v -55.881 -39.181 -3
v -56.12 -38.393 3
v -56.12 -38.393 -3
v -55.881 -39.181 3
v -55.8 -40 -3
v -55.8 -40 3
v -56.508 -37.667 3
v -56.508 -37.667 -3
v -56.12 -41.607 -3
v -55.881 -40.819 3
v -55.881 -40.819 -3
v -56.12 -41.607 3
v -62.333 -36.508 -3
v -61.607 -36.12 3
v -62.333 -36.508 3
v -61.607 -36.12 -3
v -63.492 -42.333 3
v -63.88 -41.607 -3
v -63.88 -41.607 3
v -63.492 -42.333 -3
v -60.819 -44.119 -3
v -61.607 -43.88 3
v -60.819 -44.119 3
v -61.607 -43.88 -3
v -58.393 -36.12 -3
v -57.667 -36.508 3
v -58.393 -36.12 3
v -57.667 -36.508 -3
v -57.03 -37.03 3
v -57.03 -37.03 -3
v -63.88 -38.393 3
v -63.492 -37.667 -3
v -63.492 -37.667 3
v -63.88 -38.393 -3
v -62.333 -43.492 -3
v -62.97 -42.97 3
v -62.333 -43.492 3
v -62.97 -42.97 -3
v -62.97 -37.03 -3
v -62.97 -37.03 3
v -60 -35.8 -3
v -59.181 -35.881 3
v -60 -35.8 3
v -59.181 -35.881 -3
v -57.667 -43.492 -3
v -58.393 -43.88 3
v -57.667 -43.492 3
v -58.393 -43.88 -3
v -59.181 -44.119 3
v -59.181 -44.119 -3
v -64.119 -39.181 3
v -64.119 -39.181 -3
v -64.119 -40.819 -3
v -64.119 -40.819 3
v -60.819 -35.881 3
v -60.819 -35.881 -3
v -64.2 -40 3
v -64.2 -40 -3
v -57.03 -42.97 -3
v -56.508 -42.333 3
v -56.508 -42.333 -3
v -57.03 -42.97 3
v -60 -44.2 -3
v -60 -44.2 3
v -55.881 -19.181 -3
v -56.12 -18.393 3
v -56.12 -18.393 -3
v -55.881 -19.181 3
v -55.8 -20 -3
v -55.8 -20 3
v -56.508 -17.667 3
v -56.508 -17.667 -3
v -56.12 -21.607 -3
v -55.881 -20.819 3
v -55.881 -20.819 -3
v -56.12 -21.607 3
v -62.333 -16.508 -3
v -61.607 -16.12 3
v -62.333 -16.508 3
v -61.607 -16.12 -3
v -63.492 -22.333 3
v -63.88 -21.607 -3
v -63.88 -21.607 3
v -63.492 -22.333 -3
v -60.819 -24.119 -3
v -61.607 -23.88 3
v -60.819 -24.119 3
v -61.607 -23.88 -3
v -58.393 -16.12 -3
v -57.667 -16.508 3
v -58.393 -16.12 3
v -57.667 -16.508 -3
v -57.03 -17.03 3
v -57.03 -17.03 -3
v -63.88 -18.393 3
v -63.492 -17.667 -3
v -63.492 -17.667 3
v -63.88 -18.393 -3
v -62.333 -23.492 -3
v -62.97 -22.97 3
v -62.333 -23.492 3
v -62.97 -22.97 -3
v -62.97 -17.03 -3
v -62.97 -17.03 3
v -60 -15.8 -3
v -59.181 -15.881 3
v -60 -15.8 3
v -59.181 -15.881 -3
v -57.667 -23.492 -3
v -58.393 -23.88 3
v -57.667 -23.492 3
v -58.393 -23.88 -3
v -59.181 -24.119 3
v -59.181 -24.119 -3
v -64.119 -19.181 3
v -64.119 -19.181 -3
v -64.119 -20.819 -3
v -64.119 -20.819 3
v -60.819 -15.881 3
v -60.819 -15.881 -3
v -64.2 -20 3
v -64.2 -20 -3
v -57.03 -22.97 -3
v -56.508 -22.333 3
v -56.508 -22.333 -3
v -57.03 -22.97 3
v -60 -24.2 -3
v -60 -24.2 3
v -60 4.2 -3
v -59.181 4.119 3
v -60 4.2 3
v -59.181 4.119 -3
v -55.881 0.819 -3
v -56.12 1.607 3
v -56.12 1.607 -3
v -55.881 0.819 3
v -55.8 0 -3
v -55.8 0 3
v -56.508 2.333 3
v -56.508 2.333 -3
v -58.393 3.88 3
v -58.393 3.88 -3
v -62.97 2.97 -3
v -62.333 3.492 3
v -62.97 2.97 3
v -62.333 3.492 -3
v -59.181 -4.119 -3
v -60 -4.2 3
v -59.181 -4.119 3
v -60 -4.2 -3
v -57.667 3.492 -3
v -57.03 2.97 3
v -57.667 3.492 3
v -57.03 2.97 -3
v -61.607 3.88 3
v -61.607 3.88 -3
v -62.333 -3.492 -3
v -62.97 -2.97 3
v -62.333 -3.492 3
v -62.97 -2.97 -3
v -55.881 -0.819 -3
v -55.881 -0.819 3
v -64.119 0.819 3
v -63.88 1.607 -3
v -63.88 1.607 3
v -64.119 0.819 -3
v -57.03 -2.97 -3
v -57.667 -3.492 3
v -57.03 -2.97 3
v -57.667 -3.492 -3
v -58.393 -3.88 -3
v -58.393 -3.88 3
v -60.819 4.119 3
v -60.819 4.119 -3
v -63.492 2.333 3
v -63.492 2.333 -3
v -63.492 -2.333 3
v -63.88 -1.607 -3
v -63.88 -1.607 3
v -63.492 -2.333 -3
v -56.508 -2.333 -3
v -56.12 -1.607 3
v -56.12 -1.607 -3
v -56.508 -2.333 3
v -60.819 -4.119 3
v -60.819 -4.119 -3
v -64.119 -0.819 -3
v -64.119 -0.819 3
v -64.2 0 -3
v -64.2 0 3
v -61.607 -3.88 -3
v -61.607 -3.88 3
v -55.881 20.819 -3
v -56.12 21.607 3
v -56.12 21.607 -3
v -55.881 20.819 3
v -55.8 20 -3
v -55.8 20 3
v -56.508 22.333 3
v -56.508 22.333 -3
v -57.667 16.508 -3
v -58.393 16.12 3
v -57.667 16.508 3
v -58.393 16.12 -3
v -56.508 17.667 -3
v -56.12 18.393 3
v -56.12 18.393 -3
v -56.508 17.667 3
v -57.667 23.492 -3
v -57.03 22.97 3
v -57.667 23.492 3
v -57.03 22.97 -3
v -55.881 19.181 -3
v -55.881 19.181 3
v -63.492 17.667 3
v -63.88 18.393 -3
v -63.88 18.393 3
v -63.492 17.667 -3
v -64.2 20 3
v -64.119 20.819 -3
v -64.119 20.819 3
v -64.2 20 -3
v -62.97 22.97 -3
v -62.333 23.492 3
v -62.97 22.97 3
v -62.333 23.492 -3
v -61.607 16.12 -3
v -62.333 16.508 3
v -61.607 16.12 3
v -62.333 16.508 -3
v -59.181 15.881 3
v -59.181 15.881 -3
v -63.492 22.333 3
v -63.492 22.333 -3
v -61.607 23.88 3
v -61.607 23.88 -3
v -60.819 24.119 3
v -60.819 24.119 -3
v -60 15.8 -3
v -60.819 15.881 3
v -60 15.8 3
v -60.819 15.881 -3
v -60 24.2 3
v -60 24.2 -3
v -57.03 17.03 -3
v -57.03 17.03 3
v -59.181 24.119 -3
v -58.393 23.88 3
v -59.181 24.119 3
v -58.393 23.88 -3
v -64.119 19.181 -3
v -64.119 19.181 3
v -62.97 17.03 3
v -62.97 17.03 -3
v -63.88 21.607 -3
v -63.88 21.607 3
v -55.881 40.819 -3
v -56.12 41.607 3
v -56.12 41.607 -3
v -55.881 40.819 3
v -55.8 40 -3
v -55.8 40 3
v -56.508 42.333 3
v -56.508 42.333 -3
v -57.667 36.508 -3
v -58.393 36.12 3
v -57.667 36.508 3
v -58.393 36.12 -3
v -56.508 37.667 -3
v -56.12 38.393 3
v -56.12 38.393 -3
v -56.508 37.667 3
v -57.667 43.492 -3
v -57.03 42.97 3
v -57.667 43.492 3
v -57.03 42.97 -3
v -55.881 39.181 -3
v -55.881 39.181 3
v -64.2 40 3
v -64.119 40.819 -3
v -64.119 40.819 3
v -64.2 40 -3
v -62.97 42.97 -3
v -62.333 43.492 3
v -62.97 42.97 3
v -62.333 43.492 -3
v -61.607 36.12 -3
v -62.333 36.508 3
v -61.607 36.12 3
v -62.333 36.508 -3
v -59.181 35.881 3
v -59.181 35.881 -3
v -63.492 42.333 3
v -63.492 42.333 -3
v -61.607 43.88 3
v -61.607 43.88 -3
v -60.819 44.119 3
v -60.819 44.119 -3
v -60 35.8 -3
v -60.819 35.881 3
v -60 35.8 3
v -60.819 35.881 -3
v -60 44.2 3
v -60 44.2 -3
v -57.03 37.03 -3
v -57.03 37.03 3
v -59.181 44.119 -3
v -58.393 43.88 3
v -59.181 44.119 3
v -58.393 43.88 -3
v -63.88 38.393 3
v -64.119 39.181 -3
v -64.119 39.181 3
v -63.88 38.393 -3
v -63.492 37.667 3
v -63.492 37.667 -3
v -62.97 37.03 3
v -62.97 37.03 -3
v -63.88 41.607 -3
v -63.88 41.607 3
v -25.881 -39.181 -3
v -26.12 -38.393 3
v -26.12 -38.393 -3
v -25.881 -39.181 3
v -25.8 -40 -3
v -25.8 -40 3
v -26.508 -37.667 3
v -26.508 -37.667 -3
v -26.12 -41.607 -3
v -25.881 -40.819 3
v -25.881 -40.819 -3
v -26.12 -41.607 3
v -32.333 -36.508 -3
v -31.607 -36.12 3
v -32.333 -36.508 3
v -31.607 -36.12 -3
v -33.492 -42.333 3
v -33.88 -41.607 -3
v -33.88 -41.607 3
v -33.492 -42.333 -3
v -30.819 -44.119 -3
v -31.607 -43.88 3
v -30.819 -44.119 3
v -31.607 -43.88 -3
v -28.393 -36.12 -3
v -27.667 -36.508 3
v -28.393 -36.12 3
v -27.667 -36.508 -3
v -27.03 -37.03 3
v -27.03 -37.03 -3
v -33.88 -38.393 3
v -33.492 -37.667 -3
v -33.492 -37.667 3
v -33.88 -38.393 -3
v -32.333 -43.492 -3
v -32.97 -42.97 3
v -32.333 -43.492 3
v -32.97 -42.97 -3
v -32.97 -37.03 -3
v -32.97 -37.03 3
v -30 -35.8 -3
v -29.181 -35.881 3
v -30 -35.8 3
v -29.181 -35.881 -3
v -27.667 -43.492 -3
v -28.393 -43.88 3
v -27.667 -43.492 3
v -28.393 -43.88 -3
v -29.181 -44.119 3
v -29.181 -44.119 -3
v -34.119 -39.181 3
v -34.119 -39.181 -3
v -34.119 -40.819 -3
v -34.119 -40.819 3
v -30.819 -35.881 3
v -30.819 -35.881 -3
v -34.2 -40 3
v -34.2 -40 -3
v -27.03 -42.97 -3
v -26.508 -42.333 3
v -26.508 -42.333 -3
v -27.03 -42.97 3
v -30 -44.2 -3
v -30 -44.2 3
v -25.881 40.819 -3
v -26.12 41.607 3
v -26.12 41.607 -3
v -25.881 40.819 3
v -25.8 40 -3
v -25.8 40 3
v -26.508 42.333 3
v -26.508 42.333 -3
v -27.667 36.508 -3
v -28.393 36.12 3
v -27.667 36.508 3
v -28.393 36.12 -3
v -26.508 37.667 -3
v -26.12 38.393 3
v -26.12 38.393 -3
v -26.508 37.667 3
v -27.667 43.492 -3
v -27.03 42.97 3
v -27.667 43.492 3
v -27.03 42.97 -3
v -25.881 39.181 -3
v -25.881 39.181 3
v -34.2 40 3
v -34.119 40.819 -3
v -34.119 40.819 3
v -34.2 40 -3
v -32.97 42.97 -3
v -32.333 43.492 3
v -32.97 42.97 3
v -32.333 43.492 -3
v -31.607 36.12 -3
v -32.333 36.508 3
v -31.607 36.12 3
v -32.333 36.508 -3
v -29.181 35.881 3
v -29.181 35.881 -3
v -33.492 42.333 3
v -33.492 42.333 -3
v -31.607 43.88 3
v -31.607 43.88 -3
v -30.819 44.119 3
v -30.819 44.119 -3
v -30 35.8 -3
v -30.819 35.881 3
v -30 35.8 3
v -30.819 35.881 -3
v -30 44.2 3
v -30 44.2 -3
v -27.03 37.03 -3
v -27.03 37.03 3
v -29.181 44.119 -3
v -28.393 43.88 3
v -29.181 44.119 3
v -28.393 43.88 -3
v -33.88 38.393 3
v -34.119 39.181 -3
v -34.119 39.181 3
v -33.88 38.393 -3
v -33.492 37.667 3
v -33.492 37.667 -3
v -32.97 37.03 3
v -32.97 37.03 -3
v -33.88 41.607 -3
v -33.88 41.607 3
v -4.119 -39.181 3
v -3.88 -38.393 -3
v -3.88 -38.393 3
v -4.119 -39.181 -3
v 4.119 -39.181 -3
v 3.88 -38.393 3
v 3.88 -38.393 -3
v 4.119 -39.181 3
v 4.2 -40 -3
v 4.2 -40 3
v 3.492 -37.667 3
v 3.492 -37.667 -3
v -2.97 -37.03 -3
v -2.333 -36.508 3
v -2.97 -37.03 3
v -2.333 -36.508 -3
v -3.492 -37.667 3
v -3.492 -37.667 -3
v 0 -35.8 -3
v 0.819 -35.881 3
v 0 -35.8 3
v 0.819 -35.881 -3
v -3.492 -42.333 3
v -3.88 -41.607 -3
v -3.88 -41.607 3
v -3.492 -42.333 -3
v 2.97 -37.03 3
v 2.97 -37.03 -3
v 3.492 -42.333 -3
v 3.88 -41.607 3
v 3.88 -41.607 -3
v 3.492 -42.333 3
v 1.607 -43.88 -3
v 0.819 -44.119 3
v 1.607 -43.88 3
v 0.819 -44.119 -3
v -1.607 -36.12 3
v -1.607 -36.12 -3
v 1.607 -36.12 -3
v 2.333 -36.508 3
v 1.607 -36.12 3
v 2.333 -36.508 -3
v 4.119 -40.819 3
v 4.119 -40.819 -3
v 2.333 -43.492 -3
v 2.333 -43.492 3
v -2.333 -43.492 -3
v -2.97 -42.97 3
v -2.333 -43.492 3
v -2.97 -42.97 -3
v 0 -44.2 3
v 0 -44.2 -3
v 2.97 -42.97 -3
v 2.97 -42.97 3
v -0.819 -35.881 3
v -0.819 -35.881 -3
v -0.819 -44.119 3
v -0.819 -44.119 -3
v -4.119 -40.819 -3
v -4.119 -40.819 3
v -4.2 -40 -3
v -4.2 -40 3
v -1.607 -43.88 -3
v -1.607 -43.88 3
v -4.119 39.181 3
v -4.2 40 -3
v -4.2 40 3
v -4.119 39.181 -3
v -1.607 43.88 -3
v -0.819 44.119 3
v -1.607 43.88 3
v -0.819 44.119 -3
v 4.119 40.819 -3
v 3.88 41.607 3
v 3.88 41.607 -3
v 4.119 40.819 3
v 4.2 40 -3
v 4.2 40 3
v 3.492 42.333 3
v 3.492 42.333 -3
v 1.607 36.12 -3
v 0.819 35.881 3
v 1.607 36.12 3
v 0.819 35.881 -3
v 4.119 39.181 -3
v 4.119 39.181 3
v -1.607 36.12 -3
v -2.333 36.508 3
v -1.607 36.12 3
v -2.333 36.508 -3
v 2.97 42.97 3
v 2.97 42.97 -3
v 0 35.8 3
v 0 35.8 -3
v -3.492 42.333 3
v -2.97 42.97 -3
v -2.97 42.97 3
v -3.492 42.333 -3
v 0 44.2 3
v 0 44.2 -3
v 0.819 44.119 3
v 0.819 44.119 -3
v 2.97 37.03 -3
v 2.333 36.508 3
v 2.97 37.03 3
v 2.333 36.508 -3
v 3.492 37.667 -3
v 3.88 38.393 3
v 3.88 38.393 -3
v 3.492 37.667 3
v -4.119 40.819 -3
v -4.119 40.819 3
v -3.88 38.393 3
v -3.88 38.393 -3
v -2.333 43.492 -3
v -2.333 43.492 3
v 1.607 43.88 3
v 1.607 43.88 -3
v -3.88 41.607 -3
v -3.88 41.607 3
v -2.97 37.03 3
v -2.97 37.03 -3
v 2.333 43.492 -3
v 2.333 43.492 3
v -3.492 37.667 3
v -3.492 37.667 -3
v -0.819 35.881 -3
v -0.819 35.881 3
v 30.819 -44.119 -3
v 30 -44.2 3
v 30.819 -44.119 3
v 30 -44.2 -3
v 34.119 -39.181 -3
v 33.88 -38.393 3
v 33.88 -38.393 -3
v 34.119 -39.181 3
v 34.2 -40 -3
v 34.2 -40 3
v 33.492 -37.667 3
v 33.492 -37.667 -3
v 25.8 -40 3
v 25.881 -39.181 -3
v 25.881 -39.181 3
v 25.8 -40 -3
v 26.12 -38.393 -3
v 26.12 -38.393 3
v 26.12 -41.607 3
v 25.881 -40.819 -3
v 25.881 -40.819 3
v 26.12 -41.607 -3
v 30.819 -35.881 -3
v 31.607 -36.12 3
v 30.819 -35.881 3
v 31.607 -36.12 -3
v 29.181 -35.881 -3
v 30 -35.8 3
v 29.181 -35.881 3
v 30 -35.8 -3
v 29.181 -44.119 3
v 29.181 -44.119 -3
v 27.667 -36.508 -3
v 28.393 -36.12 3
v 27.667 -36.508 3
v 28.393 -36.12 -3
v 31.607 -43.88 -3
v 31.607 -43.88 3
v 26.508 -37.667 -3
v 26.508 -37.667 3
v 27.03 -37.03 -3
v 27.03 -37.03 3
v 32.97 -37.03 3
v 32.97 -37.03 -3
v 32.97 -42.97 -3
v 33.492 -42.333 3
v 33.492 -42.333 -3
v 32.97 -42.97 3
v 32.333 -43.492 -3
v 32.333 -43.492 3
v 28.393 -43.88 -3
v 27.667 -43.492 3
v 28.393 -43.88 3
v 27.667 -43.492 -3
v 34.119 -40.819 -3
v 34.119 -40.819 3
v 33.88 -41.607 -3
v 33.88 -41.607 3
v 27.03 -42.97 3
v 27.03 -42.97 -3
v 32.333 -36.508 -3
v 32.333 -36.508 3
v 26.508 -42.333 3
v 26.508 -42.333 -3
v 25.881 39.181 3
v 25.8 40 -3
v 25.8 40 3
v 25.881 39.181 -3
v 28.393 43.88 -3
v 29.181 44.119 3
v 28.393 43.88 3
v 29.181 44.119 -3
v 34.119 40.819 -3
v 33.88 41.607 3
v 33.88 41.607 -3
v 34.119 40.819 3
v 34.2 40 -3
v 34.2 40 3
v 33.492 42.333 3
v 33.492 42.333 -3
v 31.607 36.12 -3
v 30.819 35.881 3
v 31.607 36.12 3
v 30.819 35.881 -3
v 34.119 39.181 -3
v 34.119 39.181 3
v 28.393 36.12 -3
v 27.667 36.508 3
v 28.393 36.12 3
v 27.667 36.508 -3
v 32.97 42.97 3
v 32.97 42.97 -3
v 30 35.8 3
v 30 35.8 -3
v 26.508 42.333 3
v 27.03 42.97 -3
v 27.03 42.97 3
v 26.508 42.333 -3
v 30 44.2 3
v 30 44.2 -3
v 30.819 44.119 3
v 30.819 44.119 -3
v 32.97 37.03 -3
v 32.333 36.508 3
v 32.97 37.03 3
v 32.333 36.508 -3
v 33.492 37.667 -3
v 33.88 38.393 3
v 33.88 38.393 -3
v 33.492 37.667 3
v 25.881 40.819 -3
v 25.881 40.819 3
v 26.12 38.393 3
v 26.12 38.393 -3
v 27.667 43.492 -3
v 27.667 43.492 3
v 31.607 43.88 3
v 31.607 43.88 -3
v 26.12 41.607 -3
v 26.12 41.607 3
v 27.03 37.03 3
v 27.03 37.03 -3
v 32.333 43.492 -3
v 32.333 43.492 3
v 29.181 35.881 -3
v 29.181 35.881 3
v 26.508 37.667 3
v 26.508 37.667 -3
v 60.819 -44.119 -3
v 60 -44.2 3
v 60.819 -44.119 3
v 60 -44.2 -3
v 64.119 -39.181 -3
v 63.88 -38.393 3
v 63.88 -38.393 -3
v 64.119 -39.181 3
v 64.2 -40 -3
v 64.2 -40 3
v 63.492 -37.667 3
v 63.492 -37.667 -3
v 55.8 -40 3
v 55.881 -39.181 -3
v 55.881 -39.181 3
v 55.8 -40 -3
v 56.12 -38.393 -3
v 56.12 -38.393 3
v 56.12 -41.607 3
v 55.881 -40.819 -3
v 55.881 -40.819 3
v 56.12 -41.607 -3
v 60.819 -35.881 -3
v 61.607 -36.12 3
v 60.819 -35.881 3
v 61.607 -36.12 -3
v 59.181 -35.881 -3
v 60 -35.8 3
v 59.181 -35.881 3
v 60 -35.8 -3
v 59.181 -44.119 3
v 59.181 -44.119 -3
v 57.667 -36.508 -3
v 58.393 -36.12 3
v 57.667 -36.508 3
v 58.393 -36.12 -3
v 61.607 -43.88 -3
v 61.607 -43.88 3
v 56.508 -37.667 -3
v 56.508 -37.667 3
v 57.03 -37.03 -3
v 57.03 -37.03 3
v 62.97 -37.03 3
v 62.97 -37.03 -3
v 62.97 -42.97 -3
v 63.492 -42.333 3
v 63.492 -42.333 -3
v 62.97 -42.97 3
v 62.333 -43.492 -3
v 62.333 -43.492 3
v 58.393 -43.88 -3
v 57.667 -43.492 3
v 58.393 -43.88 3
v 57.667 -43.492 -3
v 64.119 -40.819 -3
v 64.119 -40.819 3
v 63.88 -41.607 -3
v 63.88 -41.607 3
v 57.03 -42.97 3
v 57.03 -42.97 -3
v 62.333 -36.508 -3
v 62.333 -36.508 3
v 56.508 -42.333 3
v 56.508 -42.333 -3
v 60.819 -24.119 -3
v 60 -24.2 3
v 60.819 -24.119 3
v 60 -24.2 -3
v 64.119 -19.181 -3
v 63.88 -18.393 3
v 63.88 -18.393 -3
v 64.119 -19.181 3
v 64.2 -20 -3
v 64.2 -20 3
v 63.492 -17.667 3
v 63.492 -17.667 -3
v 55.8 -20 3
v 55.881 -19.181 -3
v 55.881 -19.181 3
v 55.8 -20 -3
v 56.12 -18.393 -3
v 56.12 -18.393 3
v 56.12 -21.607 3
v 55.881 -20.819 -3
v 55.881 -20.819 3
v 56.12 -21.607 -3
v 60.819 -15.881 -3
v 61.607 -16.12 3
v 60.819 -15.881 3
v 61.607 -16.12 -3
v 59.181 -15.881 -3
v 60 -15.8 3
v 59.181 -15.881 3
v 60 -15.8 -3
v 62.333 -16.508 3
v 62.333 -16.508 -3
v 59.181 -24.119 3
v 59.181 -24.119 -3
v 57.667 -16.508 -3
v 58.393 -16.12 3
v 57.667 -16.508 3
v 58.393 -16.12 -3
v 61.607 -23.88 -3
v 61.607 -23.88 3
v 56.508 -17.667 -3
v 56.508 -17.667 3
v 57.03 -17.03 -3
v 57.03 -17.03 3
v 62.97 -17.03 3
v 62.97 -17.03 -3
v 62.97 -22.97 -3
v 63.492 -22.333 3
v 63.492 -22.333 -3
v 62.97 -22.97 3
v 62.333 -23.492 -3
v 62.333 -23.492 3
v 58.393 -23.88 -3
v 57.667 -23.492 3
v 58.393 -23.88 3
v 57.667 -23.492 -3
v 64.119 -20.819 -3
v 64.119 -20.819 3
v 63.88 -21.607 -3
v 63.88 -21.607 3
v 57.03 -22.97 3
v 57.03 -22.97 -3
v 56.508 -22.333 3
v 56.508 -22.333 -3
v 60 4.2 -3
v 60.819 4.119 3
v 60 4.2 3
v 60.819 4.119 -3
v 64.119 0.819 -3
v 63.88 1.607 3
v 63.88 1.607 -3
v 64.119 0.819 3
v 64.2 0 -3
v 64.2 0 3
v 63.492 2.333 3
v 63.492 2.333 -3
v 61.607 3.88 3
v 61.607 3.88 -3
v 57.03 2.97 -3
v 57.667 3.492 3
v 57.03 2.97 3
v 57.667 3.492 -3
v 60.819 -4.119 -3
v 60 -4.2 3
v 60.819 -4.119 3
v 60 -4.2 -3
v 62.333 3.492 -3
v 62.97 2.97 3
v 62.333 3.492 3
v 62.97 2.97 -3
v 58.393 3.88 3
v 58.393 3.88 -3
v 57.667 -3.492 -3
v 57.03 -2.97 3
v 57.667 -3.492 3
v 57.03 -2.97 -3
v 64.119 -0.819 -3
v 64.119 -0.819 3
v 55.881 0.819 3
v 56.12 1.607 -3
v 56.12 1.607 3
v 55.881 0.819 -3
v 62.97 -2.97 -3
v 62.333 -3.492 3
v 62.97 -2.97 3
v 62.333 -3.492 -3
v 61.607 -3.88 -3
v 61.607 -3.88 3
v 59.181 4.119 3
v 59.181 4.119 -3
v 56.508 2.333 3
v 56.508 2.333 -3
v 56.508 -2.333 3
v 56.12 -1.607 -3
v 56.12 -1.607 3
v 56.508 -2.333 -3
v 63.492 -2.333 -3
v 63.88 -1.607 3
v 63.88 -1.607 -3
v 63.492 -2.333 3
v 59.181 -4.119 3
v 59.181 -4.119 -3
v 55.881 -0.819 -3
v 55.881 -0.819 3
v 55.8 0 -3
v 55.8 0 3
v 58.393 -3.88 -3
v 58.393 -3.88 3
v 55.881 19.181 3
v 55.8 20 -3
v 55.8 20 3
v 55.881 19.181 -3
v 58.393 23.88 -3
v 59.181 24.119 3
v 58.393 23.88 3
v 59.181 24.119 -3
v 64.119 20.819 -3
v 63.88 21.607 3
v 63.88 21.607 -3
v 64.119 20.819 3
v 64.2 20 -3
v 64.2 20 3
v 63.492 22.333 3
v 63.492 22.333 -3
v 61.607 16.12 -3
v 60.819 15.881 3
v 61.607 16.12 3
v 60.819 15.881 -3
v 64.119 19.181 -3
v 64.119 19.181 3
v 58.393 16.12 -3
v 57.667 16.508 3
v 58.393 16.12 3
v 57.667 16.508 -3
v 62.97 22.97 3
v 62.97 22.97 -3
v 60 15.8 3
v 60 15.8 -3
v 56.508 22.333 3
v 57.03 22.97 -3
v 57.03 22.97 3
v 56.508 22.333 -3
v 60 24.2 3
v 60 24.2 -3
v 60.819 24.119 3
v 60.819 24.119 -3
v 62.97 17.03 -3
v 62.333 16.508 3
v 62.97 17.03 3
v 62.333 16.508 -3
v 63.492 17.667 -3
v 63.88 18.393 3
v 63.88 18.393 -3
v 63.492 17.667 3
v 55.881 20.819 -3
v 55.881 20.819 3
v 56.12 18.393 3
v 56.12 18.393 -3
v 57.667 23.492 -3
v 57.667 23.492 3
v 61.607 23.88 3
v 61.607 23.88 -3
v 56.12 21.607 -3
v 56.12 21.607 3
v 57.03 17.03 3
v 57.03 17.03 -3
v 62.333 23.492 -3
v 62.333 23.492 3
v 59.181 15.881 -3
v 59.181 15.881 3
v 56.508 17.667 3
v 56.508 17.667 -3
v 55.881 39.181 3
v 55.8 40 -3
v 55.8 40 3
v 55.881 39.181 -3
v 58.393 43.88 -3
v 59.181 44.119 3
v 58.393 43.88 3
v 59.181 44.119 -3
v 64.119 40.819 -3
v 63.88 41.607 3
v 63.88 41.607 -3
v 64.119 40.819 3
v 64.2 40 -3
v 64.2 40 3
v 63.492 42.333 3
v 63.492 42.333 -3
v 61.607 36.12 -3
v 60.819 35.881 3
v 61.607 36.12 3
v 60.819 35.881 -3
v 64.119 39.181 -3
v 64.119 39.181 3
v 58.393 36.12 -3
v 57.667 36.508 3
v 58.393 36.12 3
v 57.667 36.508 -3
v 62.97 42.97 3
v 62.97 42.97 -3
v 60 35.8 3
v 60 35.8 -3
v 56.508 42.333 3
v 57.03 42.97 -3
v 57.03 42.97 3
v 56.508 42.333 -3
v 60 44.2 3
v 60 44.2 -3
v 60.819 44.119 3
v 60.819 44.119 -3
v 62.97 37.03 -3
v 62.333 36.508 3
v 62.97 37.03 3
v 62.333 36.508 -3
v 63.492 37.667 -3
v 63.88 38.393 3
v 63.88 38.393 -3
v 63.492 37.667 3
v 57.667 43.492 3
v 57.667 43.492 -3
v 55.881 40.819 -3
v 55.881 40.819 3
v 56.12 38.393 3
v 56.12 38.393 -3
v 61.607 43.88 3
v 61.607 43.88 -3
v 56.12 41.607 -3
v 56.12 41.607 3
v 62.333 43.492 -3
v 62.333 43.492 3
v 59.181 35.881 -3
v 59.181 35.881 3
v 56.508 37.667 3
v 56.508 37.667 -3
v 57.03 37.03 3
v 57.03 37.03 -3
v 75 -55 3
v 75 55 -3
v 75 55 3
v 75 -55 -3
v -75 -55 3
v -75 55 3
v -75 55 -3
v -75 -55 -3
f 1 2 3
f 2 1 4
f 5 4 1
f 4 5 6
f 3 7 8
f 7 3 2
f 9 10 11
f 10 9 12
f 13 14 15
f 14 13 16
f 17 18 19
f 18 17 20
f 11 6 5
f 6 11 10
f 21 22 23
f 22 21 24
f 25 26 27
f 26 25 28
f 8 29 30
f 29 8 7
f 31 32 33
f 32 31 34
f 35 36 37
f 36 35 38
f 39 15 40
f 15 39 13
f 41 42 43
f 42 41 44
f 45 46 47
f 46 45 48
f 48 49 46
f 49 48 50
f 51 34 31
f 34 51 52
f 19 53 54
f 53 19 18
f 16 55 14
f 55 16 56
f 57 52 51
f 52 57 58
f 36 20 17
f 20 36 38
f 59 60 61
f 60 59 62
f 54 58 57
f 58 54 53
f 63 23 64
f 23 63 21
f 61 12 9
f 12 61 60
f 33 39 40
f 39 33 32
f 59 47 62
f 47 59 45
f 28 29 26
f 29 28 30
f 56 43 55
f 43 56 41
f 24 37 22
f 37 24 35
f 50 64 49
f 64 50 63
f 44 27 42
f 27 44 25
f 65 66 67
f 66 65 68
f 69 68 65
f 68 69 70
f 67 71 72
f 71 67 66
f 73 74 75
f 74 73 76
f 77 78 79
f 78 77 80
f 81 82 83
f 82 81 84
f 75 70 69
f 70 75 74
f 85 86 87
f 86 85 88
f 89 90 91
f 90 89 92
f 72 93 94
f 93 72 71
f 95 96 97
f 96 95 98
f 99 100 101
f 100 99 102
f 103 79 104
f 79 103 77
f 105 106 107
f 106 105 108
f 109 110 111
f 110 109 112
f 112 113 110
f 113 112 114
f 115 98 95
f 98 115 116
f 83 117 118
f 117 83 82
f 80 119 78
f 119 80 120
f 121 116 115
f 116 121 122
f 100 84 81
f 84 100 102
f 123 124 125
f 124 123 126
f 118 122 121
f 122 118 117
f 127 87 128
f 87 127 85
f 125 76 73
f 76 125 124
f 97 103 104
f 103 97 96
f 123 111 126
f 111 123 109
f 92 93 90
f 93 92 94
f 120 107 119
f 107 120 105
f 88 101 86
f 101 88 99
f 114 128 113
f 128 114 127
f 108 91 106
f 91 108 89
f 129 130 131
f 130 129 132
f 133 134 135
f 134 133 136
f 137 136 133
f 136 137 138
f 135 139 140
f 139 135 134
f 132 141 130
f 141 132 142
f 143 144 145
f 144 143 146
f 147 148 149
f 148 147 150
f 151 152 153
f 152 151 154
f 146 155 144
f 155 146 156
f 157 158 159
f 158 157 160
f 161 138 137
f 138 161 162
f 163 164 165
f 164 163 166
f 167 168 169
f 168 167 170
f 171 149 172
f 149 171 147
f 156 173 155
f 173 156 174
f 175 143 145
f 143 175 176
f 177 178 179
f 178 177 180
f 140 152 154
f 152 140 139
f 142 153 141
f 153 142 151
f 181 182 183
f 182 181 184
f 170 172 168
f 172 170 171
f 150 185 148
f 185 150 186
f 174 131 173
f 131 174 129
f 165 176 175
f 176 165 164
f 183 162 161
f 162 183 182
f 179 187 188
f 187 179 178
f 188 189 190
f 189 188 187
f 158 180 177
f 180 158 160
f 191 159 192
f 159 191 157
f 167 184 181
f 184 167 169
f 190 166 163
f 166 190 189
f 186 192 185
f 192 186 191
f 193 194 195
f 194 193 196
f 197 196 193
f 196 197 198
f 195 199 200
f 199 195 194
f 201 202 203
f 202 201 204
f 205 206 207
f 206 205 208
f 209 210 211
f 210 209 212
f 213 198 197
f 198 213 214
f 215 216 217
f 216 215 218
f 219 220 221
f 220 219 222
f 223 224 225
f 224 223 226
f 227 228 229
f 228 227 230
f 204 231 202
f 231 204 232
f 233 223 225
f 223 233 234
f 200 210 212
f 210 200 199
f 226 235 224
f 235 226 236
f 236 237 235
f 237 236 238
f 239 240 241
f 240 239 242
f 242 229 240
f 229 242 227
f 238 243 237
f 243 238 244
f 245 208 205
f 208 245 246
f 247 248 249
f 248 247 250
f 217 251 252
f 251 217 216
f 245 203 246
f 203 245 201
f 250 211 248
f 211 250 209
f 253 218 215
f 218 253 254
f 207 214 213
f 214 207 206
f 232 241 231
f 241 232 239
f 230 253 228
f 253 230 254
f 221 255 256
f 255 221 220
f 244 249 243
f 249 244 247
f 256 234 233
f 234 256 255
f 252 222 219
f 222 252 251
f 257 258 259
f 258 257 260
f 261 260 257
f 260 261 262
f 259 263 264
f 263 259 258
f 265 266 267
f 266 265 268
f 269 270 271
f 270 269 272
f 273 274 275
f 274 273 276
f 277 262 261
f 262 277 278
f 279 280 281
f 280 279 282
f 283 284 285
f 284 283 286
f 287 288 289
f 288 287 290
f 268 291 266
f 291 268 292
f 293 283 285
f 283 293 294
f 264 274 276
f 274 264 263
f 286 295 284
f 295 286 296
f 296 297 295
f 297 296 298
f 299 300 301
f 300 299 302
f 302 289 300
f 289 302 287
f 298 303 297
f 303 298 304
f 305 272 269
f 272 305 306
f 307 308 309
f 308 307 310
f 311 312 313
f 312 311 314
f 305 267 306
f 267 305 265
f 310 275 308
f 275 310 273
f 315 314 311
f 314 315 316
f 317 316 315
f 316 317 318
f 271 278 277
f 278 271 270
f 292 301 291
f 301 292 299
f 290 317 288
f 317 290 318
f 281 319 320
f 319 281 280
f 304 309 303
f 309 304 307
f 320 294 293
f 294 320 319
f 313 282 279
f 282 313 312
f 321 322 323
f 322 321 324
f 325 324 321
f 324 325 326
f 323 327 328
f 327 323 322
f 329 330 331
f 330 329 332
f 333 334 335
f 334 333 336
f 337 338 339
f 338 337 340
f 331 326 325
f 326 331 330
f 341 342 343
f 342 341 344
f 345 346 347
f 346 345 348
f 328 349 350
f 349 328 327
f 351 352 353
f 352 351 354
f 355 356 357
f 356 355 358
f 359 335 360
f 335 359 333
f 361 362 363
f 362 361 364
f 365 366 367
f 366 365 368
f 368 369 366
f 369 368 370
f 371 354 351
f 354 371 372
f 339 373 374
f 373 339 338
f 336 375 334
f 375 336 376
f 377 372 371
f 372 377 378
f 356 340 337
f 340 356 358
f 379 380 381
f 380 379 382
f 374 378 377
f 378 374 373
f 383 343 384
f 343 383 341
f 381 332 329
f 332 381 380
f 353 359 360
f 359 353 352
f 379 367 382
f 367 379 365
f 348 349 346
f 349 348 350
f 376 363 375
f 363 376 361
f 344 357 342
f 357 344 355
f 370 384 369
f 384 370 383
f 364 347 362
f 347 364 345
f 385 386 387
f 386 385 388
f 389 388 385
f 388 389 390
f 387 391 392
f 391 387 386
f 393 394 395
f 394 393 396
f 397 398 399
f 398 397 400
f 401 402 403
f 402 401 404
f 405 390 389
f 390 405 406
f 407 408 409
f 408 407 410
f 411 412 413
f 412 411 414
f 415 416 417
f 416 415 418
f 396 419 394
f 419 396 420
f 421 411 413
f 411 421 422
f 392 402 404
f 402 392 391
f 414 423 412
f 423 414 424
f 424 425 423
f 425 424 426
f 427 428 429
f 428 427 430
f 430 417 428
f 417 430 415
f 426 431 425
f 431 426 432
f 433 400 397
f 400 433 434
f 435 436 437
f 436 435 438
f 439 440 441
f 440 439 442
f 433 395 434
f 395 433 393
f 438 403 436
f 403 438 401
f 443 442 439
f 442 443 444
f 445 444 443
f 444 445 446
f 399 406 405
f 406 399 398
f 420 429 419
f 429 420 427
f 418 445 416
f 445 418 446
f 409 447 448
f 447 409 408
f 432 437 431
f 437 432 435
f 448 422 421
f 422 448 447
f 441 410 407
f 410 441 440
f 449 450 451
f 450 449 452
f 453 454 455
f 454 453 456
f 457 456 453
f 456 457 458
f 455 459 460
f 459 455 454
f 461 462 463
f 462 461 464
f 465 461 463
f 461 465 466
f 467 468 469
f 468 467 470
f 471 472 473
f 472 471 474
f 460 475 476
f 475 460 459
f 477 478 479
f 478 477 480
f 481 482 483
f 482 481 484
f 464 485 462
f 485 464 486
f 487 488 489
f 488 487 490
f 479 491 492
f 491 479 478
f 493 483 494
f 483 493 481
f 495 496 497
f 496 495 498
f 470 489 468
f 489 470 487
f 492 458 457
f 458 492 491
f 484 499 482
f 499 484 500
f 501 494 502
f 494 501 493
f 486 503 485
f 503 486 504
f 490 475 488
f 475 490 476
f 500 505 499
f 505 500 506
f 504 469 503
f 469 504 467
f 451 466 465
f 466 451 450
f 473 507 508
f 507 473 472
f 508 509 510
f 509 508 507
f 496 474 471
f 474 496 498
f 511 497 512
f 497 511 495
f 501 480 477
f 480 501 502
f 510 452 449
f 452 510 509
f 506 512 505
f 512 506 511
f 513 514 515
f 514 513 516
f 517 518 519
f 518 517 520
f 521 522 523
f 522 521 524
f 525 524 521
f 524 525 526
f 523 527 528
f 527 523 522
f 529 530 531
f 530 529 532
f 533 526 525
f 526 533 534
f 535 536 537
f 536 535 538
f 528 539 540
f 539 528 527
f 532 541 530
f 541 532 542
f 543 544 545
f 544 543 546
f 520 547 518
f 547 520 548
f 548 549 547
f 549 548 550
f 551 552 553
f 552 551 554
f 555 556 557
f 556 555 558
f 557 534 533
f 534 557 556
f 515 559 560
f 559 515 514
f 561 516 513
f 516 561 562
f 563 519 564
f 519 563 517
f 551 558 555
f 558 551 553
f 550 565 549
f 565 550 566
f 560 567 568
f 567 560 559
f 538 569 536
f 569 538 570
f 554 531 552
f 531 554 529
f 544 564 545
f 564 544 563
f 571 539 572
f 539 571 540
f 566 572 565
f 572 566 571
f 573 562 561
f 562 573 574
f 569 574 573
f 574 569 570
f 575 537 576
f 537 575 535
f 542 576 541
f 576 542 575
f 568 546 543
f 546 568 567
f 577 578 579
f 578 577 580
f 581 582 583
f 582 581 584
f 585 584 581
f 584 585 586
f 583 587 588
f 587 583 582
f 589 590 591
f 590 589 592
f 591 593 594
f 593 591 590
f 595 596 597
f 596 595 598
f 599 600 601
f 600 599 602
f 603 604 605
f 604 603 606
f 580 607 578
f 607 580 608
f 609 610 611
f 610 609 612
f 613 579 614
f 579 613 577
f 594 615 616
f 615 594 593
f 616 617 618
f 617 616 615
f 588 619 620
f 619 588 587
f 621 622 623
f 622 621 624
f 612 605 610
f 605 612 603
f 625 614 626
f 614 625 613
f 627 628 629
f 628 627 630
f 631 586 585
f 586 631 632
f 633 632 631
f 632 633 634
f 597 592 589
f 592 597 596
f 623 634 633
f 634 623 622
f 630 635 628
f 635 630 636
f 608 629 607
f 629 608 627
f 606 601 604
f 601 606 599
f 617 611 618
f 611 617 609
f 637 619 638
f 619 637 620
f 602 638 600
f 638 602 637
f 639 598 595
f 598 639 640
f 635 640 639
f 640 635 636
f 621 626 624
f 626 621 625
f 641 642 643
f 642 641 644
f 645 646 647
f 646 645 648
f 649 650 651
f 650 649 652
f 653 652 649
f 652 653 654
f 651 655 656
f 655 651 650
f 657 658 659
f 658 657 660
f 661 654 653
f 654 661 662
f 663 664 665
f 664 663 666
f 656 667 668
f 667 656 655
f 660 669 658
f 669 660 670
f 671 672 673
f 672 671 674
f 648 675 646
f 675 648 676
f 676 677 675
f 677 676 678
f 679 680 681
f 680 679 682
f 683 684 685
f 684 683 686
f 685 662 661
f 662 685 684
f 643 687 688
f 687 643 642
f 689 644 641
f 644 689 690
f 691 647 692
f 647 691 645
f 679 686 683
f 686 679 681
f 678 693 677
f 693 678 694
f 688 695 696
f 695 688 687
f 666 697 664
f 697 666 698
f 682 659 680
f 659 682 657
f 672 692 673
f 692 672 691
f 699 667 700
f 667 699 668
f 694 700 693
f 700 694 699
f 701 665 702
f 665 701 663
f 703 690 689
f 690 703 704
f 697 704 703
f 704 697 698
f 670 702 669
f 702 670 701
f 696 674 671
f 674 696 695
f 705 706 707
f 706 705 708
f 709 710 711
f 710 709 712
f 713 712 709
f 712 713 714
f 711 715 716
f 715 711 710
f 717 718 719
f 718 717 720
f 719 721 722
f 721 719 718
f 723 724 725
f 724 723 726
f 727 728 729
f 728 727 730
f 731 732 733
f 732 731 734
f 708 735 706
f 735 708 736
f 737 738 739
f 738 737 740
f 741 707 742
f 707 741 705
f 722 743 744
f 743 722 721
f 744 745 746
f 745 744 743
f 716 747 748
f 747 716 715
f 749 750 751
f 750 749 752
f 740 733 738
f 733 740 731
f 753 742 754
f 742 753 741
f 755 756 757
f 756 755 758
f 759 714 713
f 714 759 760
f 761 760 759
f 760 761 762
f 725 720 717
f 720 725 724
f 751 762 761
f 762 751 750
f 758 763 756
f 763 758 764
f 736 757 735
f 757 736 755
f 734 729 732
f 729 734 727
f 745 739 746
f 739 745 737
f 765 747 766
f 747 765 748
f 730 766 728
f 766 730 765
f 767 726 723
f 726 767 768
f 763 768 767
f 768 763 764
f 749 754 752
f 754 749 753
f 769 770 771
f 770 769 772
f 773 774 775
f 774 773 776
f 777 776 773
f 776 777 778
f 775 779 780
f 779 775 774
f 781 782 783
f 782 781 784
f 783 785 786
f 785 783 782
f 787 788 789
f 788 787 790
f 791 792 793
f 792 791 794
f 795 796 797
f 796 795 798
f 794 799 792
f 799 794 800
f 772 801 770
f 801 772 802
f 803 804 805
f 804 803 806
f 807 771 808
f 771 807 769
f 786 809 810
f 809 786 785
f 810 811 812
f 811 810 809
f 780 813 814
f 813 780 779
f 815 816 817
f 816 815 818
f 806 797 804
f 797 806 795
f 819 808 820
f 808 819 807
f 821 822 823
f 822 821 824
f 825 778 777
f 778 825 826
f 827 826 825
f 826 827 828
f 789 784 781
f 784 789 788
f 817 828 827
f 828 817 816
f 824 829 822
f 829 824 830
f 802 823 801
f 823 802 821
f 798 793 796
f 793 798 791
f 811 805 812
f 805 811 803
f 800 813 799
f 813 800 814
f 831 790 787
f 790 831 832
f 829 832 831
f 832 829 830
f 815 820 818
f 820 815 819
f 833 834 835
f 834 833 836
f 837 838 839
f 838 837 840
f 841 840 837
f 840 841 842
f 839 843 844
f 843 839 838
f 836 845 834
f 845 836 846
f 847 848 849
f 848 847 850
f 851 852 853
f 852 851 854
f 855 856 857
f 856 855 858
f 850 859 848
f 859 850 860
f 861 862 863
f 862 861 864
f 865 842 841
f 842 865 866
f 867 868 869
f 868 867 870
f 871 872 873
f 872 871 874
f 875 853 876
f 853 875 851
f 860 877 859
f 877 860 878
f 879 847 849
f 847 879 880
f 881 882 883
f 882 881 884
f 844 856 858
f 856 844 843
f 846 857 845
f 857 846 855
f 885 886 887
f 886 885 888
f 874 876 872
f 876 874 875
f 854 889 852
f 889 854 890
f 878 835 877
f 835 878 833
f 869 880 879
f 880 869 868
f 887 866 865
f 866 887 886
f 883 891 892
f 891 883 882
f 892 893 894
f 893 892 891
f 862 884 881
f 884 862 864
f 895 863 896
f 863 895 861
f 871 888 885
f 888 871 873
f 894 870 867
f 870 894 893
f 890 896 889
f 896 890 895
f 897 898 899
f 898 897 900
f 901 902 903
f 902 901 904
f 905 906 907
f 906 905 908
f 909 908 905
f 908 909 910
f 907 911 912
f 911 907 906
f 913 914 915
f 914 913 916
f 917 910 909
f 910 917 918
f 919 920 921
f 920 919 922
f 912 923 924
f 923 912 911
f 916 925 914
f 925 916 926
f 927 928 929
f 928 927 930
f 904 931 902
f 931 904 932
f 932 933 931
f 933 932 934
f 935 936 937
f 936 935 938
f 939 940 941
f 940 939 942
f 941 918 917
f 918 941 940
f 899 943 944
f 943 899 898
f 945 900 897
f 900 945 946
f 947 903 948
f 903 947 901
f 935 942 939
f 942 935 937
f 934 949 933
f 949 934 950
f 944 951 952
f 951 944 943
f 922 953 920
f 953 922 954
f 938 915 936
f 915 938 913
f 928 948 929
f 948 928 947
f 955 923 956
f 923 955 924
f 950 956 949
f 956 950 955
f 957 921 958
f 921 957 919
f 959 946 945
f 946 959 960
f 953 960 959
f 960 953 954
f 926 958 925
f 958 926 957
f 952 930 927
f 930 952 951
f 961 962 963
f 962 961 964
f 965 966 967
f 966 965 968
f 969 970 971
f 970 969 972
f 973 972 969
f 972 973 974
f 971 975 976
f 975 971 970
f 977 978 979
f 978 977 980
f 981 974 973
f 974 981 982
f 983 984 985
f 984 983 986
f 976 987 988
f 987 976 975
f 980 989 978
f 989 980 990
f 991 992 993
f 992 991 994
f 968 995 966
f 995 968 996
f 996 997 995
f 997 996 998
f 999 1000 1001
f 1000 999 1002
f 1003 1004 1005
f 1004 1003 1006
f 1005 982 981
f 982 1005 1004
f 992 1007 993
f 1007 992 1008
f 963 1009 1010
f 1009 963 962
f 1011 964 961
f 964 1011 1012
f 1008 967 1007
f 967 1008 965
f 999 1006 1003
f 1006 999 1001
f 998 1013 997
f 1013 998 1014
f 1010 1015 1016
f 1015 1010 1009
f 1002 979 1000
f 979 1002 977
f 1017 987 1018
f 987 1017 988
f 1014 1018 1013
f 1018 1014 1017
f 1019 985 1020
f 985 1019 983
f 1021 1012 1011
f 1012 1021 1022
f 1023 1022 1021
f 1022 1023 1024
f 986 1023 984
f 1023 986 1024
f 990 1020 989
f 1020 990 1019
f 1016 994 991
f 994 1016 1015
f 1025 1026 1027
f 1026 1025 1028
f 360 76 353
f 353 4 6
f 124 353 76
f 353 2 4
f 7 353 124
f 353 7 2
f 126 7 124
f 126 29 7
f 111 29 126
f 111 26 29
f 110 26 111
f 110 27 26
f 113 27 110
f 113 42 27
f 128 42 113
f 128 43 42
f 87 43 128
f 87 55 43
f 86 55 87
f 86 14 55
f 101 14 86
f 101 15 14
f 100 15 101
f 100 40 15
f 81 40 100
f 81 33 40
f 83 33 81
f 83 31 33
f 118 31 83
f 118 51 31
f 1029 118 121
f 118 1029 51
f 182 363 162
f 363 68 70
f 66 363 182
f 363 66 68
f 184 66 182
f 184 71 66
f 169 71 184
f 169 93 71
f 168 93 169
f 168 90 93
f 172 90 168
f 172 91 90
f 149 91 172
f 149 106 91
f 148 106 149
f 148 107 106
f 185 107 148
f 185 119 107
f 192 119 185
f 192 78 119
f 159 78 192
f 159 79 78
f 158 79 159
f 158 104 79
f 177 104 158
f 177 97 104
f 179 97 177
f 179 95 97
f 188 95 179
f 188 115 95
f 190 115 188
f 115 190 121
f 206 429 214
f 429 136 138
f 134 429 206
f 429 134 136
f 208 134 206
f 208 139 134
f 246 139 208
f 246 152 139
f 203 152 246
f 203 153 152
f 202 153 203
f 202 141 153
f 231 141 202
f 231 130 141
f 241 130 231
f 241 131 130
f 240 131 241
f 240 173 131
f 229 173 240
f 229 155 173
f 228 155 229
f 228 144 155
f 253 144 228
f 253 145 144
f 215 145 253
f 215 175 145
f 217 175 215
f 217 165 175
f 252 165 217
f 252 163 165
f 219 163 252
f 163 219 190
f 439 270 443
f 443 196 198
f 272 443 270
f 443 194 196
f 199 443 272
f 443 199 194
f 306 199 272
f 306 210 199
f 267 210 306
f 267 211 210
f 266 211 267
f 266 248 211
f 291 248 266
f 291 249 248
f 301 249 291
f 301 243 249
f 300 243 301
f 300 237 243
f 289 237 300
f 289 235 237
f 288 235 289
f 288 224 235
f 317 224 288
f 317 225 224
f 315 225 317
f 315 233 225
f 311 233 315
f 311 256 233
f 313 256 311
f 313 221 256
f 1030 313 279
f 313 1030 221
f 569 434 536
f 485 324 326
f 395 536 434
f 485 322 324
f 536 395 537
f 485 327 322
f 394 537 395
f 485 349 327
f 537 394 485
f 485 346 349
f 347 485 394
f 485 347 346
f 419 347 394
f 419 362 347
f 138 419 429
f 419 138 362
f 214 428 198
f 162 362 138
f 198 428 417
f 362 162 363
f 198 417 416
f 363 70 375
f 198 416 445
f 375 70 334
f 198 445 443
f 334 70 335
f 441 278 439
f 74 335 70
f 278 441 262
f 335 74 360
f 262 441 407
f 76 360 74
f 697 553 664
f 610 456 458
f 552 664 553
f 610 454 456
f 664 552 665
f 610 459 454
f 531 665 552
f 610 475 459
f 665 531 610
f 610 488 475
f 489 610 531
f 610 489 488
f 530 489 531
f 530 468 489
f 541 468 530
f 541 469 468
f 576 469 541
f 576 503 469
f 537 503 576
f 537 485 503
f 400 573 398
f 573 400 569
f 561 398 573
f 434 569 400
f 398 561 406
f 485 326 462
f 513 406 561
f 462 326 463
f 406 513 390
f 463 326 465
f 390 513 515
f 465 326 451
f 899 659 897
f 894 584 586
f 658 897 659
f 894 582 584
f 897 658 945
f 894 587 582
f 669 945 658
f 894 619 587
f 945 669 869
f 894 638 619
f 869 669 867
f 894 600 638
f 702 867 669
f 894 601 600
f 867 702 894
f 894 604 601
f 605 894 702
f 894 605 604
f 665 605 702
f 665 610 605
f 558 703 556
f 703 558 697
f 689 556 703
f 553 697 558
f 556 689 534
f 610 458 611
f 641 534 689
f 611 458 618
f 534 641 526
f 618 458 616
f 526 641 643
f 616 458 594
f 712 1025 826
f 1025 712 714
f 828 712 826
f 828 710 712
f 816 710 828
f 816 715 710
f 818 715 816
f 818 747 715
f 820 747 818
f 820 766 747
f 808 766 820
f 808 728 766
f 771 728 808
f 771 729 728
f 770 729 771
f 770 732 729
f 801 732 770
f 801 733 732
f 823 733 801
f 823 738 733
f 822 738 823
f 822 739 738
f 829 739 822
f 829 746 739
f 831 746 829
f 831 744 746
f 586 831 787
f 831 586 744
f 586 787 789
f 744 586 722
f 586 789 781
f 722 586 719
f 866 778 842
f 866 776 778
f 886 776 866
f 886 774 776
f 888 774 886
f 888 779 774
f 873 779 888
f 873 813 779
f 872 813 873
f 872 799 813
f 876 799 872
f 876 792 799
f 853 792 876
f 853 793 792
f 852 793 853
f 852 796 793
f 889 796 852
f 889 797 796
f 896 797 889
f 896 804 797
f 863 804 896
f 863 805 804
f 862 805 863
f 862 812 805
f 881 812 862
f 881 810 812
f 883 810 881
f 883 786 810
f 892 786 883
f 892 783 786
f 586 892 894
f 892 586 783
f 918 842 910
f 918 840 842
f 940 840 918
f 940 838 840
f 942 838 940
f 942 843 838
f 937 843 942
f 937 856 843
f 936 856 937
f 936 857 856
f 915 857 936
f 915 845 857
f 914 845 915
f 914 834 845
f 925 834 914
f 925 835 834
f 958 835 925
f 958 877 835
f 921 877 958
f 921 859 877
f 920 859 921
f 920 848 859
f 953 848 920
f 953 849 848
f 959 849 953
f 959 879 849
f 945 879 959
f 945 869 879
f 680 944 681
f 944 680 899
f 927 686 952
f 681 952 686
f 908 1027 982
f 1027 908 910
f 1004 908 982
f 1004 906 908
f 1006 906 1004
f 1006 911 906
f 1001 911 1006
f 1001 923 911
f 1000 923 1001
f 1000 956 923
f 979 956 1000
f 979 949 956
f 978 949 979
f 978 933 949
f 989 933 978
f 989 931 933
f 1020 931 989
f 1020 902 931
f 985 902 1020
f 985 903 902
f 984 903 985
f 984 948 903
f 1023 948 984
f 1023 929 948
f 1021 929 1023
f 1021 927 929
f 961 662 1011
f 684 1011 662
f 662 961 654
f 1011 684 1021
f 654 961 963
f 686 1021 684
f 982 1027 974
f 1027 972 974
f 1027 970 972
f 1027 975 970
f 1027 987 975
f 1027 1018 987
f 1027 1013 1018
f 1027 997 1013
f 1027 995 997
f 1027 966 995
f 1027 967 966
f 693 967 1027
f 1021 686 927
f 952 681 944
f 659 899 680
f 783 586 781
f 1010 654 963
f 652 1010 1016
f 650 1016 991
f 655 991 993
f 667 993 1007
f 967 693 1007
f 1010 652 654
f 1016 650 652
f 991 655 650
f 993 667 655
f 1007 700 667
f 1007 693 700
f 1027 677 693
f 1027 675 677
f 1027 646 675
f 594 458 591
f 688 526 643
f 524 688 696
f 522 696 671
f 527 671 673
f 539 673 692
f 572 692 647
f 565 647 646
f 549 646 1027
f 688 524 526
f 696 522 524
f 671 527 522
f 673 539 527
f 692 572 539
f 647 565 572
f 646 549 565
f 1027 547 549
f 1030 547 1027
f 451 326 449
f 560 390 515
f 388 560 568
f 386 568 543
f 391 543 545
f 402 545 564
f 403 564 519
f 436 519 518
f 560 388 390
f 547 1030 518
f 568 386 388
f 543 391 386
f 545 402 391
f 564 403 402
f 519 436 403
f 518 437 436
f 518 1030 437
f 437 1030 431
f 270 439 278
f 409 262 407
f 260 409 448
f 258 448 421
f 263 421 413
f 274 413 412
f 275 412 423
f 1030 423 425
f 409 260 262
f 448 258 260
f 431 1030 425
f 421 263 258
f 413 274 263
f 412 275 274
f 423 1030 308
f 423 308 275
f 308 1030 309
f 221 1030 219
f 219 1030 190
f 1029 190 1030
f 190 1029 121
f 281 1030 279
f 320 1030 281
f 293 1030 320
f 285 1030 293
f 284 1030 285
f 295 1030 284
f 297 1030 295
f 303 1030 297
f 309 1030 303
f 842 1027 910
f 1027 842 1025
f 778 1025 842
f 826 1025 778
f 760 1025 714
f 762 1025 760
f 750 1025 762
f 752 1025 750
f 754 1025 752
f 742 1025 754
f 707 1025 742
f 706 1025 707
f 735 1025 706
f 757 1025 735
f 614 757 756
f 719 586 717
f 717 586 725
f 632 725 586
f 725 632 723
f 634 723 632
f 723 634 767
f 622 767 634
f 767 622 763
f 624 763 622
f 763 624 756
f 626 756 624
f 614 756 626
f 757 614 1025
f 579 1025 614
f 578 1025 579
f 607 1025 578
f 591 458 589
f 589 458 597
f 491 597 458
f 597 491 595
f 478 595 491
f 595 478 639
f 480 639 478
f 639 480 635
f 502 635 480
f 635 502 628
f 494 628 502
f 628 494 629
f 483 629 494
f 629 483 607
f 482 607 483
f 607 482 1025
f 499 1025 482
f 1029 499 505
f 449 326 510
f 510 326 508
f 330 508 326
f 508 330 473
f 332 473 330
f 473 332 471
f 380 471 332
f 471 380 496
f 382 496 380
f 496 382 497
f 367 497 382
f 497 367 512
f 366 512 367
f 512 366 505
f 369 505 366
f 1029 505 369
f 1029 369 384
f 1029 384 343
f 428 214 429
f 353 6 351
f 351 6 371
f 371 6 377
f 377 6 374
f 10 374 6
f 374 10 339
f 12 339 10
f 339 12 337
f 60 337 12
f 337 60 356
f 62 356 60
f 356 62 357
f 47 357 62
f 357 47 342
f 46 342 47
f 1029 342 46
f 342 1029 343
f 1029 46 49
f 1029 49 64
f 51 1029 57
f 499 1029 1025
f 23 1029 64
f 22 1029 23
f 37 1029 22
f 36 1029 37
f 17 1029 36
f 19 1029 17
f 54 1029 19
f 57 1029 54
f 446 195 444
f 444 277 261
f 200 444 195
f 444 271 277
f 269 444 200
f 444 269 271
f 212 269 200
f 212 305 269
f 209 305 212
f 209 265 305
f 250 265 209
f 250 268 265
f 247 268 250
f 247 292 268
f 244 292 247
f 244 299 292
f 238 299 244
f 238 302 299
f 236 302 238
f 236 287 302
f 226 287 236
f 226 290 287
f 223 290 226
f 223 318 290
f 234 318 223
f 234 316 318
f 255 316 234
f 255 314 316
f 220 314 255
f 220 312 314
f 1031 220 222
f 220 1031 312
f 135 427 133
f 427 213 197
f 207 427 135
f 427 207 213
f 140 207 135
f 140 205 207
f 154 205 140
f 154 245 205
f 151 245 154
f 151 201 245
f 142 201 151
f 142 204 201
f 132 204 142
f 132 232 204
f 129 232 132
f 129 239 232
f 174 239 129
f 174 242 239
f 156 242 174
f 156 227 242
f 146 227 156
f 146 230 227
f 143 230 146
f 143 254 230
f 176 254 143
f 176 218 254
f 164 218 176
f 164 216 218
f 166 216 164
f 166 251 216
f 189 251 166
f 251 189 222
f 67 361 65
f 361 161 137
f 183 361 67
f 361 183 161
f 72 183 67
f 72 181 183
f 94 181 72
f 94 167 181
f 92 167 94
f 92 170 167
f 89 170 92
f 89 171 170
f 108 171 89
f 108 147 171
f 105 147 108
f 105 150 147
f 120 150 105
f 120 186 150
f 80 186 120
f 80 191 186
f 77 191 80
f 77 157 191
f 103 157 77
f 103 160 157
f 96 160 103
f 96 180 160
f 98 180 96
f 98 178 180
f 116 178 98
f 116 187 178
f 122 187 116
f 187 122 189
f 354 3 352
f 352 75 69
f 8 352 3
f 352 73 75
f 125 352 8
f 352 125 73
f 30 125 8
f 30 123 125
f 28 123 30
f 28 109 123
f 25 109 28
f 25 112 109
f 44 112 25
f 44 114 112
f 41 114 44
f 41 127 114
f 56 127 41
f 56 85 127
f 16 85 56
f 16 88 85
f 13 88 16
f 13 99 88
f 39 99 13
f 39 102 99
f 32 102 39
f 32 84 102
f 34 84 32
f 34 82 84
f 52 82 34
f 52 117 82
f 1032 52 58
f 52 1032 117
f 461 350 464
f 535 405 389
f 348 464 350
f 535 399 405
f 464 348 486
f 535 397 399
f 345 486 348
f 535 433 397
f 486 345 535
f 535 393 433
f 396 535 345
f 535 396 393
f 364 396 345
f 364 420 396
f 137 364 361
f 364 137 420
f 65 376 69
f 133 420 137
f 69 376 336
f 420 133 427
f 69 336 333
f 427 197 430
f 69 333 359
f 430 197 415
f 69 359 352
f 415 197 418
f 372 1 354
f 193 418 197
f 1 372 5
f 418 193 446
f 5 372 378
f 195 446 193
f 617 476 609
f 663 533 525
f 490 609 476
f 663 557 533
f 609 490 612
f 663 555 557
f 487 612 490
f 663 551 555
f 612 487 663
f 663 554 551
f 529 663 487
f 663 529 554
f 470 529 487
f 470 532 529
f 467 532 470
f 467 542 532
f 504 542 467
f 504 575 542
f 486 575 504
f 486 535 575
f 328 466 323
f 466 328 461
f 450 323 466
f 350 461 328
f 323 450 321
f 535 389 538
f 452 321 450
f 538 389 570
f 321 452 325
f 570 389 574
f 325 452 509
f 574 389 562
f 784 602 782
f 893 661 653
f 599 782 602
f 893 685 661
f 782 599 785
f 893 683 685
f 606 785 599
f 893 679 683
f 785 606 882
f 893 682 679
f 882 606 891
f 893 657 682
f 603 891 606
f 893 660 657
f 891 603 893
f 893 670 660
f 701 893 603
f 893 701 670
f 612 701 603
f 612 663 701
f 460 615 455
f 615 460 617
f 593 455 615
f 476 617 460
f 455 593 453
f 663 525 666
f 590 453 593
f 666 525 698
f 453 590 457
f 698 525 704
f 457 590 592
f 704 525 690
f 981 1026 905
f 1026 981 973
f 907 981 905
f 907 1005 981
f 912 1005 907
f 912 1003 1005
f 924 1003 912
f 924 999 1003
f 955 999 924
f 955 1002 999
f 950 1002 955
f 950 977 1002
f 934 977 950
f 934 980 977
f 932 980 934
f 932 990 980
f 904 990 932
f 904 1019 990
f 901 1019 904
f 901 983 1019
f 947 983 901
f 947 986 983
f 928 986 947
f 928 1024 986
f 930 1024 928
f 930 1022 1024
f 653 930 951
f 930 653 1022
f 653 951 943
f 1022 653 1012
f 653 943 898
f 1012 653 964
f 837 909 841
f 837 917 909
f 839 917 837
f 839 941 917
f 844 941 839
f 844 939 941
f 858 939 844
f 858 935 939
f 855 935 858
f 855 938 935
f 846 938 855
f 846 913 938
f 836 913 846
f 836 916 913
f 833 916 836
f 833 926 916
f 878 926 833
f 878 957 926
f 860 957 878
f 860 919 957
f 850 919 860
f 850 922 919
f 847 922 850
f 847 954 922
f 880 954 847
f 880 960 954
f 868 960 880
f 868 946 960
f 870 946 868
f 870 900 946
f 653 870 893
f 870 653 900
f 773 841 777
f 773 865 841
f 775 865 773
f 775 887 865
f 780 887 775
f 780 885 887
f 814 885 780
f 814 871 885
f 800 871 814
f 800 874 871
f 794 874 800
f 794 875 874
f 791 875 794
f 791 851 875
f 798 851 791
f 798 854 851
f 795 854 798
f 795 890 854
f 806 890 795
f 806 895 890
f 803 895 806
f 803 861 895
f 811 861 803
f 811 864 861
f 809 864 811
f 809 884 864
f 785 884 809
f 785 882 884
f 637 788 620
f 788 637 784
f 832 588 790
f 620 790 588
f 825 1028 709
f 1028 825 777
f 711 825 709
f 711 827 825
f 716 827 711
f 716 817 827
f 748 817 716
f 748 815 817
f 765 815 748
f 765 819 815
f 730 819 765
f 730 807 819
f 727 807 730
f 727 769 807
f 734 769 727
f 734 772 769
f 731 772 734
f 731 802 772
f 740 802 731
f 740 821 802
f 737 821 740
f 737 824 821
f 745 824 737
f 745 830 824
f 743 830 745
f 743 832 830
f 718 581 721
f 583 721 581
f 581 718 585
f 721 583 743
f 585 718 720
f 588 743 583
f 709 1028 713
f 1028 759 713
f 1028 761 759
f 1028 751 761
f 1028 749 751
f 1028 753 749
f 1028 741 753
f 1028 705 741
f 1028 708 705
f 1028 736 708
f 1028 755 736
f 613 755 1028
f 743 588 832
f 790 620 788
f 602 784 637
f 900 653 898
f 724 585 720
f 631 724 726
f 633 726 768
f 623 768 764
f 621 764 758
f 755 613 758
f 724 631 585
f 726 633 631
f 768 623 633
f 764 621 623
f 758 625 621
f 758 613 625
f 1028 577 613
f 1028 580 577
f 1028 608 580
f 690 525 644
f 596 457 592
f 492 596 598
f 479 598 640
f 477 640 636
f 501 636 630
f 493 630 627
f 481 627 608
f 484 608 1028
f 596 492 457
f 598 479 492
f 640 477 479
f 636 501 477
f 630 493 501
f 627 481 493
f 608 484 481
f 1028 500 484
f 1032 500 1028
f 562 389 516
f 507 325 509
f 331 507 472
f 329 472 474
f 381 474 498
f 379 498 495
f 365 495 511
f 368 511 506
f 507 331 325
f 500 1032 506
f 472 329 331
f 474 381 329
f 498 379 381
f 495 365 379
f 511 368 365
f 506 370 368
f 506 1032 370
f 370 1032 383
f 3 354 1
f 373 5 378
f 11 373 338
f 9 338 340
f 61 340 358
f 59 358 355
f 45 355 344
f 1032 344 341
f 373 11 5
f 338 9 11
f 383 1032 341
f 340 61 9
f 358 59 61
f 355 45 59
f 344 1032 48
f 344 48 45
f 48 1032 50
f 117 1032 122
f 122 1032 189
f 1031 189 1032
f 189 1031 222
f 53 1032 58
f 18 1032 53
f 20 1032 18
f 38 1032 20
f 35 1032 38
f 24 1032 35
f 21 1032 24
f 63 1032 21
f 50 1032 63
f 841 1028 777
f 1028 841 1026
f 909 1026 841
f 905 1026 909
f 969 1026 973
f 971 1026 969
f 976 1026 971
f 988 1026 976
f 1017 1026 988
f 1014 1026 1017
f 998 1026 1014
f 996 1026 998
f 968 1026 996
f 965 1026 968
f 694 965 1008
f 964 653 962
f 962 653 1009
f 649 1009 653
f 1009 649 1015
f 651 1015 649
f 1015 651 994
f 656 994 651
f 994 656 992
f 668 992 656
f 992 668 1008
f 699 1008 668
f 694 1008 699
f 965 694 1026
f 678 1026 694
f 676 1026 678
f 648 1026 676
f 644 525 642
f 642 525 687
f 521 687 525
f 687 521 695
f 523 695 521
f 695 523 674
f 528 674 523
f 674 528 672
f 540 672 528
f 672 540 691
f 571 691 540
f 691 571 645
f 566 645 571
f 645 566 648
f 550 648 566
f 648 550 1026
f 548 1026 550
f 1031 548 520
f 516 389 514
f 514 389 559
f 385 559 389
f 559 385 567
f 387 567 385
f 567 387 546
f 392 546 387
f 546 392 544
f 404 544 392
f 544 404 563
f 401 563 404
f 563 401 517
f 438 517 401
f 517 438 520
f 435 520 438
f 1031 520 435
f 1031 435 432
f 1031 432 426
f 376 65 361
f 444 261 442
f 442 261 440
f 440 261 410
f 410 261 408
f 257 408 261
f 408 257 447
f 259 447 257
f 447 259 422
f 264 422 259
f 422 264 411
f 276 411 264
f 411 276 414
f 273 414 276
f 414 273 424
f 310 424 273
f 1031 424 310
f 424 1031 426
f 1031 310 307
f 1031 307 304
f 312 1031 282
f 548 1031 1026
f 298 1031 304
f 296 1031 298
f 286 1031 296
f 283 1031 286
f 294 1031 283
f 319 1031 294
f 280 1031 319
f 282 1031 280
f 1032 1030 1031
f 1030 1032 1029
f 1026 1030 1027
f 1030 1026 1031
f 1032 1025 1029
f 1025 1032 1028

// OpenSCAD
$fn = 32;

// ----------------------------------------------------------------------
// Perforated panel 150 x 110 x 6
// 5 x 5 Ø8.4 holes, frame layout
// ----------------------------------------------------------------------

// --- parameters (mm) ---
panel = [150, 110, 6];  // overall size (x, y, z)
hole_d = 8.4;           // hole diameter
pitch_x = 30;           // hole pitch along X
pitch_y = 20;           // hole pitch along Y

// --- derived feature positions (mm) ---
margin = hole_d / 2 + 2;            // = 6.2   clearance from the panel edge
cols = floor((panel[0] - 2 * margin) / pitch_x) + 1;  // = 5   how many columns fit in X
rows = floor((panel[1] - 2 * margin) / pitch_y) + 1;  // = 5   how many rows fit in Y
span_x = (cols - 1) * pitch_x + 0;  // = 120   width of the field
span_y = (rows - 1) * pitch_y;      // = 80   height of the field
origin_x = -span_x / 2;             // = -60   X of the first hole
origin_y = -span_y / 2;             // = -40   Y of the first row
holes = 2 * cols + 2 * (rows - 2);  // = 16   holes around the frame
feature_centers = [
  [origin_x + 0 * pitch_x, origin_y + 0 * pitch_y],
  [origin_x + 0 * pitch_x, origin_y + 1 * pitch_y],
  [origin_x + 0 * pitch_x, origin_y + 2 * pitch_y],
  [origin_x + 0 * pitch_x, origin_y + 3 * pitch_y],
  [origin_x + 0 * pitch_x, origin_y + 4 * pitch_y],
  [origin_x + 1 * pitch_x, origin_y + 0 * pitch_y],
  [origin_x + 1 * pitch_x, origin_y + 4 * pitch_y],
  [origin_x + 2 * pitch_x, origin_y + 0 * pitch_y],
  [origin_x + 2 * pitch_x, origin_y + 4 * pitch_y],
  [origin_x + 3 * pitch_x, origin_y + 0 * pitch_y],
  [origin_x + 3 * pitch_x, origin_y + 4 * pitch_y],
  [origin_x + 4 * pitch_x, origin_y + 0 * pitch_y],
  [origin_x + 4 * pitch_x, origin_y + 1 * pitch_y],
  [origin_x + 4 * pitch_x, origin_y + 2 * pitch_y],
  [origin_x + 4 * pitch_x, origin_y + 3 * pitch_y],
  [origin_x + 4 * pitch_x, origin_y + 4 * pitch_y]
];   // hole centres, used verbatim by the cutter loop

// panel outline, every hole through
difference() {
  cube(panel, center = true);
  for (centre = feature_centers)
    translate([centre[0], centre[1], 0])
      cylinder(d = hole_d, h = panel[2] + 2, center = true);
}
